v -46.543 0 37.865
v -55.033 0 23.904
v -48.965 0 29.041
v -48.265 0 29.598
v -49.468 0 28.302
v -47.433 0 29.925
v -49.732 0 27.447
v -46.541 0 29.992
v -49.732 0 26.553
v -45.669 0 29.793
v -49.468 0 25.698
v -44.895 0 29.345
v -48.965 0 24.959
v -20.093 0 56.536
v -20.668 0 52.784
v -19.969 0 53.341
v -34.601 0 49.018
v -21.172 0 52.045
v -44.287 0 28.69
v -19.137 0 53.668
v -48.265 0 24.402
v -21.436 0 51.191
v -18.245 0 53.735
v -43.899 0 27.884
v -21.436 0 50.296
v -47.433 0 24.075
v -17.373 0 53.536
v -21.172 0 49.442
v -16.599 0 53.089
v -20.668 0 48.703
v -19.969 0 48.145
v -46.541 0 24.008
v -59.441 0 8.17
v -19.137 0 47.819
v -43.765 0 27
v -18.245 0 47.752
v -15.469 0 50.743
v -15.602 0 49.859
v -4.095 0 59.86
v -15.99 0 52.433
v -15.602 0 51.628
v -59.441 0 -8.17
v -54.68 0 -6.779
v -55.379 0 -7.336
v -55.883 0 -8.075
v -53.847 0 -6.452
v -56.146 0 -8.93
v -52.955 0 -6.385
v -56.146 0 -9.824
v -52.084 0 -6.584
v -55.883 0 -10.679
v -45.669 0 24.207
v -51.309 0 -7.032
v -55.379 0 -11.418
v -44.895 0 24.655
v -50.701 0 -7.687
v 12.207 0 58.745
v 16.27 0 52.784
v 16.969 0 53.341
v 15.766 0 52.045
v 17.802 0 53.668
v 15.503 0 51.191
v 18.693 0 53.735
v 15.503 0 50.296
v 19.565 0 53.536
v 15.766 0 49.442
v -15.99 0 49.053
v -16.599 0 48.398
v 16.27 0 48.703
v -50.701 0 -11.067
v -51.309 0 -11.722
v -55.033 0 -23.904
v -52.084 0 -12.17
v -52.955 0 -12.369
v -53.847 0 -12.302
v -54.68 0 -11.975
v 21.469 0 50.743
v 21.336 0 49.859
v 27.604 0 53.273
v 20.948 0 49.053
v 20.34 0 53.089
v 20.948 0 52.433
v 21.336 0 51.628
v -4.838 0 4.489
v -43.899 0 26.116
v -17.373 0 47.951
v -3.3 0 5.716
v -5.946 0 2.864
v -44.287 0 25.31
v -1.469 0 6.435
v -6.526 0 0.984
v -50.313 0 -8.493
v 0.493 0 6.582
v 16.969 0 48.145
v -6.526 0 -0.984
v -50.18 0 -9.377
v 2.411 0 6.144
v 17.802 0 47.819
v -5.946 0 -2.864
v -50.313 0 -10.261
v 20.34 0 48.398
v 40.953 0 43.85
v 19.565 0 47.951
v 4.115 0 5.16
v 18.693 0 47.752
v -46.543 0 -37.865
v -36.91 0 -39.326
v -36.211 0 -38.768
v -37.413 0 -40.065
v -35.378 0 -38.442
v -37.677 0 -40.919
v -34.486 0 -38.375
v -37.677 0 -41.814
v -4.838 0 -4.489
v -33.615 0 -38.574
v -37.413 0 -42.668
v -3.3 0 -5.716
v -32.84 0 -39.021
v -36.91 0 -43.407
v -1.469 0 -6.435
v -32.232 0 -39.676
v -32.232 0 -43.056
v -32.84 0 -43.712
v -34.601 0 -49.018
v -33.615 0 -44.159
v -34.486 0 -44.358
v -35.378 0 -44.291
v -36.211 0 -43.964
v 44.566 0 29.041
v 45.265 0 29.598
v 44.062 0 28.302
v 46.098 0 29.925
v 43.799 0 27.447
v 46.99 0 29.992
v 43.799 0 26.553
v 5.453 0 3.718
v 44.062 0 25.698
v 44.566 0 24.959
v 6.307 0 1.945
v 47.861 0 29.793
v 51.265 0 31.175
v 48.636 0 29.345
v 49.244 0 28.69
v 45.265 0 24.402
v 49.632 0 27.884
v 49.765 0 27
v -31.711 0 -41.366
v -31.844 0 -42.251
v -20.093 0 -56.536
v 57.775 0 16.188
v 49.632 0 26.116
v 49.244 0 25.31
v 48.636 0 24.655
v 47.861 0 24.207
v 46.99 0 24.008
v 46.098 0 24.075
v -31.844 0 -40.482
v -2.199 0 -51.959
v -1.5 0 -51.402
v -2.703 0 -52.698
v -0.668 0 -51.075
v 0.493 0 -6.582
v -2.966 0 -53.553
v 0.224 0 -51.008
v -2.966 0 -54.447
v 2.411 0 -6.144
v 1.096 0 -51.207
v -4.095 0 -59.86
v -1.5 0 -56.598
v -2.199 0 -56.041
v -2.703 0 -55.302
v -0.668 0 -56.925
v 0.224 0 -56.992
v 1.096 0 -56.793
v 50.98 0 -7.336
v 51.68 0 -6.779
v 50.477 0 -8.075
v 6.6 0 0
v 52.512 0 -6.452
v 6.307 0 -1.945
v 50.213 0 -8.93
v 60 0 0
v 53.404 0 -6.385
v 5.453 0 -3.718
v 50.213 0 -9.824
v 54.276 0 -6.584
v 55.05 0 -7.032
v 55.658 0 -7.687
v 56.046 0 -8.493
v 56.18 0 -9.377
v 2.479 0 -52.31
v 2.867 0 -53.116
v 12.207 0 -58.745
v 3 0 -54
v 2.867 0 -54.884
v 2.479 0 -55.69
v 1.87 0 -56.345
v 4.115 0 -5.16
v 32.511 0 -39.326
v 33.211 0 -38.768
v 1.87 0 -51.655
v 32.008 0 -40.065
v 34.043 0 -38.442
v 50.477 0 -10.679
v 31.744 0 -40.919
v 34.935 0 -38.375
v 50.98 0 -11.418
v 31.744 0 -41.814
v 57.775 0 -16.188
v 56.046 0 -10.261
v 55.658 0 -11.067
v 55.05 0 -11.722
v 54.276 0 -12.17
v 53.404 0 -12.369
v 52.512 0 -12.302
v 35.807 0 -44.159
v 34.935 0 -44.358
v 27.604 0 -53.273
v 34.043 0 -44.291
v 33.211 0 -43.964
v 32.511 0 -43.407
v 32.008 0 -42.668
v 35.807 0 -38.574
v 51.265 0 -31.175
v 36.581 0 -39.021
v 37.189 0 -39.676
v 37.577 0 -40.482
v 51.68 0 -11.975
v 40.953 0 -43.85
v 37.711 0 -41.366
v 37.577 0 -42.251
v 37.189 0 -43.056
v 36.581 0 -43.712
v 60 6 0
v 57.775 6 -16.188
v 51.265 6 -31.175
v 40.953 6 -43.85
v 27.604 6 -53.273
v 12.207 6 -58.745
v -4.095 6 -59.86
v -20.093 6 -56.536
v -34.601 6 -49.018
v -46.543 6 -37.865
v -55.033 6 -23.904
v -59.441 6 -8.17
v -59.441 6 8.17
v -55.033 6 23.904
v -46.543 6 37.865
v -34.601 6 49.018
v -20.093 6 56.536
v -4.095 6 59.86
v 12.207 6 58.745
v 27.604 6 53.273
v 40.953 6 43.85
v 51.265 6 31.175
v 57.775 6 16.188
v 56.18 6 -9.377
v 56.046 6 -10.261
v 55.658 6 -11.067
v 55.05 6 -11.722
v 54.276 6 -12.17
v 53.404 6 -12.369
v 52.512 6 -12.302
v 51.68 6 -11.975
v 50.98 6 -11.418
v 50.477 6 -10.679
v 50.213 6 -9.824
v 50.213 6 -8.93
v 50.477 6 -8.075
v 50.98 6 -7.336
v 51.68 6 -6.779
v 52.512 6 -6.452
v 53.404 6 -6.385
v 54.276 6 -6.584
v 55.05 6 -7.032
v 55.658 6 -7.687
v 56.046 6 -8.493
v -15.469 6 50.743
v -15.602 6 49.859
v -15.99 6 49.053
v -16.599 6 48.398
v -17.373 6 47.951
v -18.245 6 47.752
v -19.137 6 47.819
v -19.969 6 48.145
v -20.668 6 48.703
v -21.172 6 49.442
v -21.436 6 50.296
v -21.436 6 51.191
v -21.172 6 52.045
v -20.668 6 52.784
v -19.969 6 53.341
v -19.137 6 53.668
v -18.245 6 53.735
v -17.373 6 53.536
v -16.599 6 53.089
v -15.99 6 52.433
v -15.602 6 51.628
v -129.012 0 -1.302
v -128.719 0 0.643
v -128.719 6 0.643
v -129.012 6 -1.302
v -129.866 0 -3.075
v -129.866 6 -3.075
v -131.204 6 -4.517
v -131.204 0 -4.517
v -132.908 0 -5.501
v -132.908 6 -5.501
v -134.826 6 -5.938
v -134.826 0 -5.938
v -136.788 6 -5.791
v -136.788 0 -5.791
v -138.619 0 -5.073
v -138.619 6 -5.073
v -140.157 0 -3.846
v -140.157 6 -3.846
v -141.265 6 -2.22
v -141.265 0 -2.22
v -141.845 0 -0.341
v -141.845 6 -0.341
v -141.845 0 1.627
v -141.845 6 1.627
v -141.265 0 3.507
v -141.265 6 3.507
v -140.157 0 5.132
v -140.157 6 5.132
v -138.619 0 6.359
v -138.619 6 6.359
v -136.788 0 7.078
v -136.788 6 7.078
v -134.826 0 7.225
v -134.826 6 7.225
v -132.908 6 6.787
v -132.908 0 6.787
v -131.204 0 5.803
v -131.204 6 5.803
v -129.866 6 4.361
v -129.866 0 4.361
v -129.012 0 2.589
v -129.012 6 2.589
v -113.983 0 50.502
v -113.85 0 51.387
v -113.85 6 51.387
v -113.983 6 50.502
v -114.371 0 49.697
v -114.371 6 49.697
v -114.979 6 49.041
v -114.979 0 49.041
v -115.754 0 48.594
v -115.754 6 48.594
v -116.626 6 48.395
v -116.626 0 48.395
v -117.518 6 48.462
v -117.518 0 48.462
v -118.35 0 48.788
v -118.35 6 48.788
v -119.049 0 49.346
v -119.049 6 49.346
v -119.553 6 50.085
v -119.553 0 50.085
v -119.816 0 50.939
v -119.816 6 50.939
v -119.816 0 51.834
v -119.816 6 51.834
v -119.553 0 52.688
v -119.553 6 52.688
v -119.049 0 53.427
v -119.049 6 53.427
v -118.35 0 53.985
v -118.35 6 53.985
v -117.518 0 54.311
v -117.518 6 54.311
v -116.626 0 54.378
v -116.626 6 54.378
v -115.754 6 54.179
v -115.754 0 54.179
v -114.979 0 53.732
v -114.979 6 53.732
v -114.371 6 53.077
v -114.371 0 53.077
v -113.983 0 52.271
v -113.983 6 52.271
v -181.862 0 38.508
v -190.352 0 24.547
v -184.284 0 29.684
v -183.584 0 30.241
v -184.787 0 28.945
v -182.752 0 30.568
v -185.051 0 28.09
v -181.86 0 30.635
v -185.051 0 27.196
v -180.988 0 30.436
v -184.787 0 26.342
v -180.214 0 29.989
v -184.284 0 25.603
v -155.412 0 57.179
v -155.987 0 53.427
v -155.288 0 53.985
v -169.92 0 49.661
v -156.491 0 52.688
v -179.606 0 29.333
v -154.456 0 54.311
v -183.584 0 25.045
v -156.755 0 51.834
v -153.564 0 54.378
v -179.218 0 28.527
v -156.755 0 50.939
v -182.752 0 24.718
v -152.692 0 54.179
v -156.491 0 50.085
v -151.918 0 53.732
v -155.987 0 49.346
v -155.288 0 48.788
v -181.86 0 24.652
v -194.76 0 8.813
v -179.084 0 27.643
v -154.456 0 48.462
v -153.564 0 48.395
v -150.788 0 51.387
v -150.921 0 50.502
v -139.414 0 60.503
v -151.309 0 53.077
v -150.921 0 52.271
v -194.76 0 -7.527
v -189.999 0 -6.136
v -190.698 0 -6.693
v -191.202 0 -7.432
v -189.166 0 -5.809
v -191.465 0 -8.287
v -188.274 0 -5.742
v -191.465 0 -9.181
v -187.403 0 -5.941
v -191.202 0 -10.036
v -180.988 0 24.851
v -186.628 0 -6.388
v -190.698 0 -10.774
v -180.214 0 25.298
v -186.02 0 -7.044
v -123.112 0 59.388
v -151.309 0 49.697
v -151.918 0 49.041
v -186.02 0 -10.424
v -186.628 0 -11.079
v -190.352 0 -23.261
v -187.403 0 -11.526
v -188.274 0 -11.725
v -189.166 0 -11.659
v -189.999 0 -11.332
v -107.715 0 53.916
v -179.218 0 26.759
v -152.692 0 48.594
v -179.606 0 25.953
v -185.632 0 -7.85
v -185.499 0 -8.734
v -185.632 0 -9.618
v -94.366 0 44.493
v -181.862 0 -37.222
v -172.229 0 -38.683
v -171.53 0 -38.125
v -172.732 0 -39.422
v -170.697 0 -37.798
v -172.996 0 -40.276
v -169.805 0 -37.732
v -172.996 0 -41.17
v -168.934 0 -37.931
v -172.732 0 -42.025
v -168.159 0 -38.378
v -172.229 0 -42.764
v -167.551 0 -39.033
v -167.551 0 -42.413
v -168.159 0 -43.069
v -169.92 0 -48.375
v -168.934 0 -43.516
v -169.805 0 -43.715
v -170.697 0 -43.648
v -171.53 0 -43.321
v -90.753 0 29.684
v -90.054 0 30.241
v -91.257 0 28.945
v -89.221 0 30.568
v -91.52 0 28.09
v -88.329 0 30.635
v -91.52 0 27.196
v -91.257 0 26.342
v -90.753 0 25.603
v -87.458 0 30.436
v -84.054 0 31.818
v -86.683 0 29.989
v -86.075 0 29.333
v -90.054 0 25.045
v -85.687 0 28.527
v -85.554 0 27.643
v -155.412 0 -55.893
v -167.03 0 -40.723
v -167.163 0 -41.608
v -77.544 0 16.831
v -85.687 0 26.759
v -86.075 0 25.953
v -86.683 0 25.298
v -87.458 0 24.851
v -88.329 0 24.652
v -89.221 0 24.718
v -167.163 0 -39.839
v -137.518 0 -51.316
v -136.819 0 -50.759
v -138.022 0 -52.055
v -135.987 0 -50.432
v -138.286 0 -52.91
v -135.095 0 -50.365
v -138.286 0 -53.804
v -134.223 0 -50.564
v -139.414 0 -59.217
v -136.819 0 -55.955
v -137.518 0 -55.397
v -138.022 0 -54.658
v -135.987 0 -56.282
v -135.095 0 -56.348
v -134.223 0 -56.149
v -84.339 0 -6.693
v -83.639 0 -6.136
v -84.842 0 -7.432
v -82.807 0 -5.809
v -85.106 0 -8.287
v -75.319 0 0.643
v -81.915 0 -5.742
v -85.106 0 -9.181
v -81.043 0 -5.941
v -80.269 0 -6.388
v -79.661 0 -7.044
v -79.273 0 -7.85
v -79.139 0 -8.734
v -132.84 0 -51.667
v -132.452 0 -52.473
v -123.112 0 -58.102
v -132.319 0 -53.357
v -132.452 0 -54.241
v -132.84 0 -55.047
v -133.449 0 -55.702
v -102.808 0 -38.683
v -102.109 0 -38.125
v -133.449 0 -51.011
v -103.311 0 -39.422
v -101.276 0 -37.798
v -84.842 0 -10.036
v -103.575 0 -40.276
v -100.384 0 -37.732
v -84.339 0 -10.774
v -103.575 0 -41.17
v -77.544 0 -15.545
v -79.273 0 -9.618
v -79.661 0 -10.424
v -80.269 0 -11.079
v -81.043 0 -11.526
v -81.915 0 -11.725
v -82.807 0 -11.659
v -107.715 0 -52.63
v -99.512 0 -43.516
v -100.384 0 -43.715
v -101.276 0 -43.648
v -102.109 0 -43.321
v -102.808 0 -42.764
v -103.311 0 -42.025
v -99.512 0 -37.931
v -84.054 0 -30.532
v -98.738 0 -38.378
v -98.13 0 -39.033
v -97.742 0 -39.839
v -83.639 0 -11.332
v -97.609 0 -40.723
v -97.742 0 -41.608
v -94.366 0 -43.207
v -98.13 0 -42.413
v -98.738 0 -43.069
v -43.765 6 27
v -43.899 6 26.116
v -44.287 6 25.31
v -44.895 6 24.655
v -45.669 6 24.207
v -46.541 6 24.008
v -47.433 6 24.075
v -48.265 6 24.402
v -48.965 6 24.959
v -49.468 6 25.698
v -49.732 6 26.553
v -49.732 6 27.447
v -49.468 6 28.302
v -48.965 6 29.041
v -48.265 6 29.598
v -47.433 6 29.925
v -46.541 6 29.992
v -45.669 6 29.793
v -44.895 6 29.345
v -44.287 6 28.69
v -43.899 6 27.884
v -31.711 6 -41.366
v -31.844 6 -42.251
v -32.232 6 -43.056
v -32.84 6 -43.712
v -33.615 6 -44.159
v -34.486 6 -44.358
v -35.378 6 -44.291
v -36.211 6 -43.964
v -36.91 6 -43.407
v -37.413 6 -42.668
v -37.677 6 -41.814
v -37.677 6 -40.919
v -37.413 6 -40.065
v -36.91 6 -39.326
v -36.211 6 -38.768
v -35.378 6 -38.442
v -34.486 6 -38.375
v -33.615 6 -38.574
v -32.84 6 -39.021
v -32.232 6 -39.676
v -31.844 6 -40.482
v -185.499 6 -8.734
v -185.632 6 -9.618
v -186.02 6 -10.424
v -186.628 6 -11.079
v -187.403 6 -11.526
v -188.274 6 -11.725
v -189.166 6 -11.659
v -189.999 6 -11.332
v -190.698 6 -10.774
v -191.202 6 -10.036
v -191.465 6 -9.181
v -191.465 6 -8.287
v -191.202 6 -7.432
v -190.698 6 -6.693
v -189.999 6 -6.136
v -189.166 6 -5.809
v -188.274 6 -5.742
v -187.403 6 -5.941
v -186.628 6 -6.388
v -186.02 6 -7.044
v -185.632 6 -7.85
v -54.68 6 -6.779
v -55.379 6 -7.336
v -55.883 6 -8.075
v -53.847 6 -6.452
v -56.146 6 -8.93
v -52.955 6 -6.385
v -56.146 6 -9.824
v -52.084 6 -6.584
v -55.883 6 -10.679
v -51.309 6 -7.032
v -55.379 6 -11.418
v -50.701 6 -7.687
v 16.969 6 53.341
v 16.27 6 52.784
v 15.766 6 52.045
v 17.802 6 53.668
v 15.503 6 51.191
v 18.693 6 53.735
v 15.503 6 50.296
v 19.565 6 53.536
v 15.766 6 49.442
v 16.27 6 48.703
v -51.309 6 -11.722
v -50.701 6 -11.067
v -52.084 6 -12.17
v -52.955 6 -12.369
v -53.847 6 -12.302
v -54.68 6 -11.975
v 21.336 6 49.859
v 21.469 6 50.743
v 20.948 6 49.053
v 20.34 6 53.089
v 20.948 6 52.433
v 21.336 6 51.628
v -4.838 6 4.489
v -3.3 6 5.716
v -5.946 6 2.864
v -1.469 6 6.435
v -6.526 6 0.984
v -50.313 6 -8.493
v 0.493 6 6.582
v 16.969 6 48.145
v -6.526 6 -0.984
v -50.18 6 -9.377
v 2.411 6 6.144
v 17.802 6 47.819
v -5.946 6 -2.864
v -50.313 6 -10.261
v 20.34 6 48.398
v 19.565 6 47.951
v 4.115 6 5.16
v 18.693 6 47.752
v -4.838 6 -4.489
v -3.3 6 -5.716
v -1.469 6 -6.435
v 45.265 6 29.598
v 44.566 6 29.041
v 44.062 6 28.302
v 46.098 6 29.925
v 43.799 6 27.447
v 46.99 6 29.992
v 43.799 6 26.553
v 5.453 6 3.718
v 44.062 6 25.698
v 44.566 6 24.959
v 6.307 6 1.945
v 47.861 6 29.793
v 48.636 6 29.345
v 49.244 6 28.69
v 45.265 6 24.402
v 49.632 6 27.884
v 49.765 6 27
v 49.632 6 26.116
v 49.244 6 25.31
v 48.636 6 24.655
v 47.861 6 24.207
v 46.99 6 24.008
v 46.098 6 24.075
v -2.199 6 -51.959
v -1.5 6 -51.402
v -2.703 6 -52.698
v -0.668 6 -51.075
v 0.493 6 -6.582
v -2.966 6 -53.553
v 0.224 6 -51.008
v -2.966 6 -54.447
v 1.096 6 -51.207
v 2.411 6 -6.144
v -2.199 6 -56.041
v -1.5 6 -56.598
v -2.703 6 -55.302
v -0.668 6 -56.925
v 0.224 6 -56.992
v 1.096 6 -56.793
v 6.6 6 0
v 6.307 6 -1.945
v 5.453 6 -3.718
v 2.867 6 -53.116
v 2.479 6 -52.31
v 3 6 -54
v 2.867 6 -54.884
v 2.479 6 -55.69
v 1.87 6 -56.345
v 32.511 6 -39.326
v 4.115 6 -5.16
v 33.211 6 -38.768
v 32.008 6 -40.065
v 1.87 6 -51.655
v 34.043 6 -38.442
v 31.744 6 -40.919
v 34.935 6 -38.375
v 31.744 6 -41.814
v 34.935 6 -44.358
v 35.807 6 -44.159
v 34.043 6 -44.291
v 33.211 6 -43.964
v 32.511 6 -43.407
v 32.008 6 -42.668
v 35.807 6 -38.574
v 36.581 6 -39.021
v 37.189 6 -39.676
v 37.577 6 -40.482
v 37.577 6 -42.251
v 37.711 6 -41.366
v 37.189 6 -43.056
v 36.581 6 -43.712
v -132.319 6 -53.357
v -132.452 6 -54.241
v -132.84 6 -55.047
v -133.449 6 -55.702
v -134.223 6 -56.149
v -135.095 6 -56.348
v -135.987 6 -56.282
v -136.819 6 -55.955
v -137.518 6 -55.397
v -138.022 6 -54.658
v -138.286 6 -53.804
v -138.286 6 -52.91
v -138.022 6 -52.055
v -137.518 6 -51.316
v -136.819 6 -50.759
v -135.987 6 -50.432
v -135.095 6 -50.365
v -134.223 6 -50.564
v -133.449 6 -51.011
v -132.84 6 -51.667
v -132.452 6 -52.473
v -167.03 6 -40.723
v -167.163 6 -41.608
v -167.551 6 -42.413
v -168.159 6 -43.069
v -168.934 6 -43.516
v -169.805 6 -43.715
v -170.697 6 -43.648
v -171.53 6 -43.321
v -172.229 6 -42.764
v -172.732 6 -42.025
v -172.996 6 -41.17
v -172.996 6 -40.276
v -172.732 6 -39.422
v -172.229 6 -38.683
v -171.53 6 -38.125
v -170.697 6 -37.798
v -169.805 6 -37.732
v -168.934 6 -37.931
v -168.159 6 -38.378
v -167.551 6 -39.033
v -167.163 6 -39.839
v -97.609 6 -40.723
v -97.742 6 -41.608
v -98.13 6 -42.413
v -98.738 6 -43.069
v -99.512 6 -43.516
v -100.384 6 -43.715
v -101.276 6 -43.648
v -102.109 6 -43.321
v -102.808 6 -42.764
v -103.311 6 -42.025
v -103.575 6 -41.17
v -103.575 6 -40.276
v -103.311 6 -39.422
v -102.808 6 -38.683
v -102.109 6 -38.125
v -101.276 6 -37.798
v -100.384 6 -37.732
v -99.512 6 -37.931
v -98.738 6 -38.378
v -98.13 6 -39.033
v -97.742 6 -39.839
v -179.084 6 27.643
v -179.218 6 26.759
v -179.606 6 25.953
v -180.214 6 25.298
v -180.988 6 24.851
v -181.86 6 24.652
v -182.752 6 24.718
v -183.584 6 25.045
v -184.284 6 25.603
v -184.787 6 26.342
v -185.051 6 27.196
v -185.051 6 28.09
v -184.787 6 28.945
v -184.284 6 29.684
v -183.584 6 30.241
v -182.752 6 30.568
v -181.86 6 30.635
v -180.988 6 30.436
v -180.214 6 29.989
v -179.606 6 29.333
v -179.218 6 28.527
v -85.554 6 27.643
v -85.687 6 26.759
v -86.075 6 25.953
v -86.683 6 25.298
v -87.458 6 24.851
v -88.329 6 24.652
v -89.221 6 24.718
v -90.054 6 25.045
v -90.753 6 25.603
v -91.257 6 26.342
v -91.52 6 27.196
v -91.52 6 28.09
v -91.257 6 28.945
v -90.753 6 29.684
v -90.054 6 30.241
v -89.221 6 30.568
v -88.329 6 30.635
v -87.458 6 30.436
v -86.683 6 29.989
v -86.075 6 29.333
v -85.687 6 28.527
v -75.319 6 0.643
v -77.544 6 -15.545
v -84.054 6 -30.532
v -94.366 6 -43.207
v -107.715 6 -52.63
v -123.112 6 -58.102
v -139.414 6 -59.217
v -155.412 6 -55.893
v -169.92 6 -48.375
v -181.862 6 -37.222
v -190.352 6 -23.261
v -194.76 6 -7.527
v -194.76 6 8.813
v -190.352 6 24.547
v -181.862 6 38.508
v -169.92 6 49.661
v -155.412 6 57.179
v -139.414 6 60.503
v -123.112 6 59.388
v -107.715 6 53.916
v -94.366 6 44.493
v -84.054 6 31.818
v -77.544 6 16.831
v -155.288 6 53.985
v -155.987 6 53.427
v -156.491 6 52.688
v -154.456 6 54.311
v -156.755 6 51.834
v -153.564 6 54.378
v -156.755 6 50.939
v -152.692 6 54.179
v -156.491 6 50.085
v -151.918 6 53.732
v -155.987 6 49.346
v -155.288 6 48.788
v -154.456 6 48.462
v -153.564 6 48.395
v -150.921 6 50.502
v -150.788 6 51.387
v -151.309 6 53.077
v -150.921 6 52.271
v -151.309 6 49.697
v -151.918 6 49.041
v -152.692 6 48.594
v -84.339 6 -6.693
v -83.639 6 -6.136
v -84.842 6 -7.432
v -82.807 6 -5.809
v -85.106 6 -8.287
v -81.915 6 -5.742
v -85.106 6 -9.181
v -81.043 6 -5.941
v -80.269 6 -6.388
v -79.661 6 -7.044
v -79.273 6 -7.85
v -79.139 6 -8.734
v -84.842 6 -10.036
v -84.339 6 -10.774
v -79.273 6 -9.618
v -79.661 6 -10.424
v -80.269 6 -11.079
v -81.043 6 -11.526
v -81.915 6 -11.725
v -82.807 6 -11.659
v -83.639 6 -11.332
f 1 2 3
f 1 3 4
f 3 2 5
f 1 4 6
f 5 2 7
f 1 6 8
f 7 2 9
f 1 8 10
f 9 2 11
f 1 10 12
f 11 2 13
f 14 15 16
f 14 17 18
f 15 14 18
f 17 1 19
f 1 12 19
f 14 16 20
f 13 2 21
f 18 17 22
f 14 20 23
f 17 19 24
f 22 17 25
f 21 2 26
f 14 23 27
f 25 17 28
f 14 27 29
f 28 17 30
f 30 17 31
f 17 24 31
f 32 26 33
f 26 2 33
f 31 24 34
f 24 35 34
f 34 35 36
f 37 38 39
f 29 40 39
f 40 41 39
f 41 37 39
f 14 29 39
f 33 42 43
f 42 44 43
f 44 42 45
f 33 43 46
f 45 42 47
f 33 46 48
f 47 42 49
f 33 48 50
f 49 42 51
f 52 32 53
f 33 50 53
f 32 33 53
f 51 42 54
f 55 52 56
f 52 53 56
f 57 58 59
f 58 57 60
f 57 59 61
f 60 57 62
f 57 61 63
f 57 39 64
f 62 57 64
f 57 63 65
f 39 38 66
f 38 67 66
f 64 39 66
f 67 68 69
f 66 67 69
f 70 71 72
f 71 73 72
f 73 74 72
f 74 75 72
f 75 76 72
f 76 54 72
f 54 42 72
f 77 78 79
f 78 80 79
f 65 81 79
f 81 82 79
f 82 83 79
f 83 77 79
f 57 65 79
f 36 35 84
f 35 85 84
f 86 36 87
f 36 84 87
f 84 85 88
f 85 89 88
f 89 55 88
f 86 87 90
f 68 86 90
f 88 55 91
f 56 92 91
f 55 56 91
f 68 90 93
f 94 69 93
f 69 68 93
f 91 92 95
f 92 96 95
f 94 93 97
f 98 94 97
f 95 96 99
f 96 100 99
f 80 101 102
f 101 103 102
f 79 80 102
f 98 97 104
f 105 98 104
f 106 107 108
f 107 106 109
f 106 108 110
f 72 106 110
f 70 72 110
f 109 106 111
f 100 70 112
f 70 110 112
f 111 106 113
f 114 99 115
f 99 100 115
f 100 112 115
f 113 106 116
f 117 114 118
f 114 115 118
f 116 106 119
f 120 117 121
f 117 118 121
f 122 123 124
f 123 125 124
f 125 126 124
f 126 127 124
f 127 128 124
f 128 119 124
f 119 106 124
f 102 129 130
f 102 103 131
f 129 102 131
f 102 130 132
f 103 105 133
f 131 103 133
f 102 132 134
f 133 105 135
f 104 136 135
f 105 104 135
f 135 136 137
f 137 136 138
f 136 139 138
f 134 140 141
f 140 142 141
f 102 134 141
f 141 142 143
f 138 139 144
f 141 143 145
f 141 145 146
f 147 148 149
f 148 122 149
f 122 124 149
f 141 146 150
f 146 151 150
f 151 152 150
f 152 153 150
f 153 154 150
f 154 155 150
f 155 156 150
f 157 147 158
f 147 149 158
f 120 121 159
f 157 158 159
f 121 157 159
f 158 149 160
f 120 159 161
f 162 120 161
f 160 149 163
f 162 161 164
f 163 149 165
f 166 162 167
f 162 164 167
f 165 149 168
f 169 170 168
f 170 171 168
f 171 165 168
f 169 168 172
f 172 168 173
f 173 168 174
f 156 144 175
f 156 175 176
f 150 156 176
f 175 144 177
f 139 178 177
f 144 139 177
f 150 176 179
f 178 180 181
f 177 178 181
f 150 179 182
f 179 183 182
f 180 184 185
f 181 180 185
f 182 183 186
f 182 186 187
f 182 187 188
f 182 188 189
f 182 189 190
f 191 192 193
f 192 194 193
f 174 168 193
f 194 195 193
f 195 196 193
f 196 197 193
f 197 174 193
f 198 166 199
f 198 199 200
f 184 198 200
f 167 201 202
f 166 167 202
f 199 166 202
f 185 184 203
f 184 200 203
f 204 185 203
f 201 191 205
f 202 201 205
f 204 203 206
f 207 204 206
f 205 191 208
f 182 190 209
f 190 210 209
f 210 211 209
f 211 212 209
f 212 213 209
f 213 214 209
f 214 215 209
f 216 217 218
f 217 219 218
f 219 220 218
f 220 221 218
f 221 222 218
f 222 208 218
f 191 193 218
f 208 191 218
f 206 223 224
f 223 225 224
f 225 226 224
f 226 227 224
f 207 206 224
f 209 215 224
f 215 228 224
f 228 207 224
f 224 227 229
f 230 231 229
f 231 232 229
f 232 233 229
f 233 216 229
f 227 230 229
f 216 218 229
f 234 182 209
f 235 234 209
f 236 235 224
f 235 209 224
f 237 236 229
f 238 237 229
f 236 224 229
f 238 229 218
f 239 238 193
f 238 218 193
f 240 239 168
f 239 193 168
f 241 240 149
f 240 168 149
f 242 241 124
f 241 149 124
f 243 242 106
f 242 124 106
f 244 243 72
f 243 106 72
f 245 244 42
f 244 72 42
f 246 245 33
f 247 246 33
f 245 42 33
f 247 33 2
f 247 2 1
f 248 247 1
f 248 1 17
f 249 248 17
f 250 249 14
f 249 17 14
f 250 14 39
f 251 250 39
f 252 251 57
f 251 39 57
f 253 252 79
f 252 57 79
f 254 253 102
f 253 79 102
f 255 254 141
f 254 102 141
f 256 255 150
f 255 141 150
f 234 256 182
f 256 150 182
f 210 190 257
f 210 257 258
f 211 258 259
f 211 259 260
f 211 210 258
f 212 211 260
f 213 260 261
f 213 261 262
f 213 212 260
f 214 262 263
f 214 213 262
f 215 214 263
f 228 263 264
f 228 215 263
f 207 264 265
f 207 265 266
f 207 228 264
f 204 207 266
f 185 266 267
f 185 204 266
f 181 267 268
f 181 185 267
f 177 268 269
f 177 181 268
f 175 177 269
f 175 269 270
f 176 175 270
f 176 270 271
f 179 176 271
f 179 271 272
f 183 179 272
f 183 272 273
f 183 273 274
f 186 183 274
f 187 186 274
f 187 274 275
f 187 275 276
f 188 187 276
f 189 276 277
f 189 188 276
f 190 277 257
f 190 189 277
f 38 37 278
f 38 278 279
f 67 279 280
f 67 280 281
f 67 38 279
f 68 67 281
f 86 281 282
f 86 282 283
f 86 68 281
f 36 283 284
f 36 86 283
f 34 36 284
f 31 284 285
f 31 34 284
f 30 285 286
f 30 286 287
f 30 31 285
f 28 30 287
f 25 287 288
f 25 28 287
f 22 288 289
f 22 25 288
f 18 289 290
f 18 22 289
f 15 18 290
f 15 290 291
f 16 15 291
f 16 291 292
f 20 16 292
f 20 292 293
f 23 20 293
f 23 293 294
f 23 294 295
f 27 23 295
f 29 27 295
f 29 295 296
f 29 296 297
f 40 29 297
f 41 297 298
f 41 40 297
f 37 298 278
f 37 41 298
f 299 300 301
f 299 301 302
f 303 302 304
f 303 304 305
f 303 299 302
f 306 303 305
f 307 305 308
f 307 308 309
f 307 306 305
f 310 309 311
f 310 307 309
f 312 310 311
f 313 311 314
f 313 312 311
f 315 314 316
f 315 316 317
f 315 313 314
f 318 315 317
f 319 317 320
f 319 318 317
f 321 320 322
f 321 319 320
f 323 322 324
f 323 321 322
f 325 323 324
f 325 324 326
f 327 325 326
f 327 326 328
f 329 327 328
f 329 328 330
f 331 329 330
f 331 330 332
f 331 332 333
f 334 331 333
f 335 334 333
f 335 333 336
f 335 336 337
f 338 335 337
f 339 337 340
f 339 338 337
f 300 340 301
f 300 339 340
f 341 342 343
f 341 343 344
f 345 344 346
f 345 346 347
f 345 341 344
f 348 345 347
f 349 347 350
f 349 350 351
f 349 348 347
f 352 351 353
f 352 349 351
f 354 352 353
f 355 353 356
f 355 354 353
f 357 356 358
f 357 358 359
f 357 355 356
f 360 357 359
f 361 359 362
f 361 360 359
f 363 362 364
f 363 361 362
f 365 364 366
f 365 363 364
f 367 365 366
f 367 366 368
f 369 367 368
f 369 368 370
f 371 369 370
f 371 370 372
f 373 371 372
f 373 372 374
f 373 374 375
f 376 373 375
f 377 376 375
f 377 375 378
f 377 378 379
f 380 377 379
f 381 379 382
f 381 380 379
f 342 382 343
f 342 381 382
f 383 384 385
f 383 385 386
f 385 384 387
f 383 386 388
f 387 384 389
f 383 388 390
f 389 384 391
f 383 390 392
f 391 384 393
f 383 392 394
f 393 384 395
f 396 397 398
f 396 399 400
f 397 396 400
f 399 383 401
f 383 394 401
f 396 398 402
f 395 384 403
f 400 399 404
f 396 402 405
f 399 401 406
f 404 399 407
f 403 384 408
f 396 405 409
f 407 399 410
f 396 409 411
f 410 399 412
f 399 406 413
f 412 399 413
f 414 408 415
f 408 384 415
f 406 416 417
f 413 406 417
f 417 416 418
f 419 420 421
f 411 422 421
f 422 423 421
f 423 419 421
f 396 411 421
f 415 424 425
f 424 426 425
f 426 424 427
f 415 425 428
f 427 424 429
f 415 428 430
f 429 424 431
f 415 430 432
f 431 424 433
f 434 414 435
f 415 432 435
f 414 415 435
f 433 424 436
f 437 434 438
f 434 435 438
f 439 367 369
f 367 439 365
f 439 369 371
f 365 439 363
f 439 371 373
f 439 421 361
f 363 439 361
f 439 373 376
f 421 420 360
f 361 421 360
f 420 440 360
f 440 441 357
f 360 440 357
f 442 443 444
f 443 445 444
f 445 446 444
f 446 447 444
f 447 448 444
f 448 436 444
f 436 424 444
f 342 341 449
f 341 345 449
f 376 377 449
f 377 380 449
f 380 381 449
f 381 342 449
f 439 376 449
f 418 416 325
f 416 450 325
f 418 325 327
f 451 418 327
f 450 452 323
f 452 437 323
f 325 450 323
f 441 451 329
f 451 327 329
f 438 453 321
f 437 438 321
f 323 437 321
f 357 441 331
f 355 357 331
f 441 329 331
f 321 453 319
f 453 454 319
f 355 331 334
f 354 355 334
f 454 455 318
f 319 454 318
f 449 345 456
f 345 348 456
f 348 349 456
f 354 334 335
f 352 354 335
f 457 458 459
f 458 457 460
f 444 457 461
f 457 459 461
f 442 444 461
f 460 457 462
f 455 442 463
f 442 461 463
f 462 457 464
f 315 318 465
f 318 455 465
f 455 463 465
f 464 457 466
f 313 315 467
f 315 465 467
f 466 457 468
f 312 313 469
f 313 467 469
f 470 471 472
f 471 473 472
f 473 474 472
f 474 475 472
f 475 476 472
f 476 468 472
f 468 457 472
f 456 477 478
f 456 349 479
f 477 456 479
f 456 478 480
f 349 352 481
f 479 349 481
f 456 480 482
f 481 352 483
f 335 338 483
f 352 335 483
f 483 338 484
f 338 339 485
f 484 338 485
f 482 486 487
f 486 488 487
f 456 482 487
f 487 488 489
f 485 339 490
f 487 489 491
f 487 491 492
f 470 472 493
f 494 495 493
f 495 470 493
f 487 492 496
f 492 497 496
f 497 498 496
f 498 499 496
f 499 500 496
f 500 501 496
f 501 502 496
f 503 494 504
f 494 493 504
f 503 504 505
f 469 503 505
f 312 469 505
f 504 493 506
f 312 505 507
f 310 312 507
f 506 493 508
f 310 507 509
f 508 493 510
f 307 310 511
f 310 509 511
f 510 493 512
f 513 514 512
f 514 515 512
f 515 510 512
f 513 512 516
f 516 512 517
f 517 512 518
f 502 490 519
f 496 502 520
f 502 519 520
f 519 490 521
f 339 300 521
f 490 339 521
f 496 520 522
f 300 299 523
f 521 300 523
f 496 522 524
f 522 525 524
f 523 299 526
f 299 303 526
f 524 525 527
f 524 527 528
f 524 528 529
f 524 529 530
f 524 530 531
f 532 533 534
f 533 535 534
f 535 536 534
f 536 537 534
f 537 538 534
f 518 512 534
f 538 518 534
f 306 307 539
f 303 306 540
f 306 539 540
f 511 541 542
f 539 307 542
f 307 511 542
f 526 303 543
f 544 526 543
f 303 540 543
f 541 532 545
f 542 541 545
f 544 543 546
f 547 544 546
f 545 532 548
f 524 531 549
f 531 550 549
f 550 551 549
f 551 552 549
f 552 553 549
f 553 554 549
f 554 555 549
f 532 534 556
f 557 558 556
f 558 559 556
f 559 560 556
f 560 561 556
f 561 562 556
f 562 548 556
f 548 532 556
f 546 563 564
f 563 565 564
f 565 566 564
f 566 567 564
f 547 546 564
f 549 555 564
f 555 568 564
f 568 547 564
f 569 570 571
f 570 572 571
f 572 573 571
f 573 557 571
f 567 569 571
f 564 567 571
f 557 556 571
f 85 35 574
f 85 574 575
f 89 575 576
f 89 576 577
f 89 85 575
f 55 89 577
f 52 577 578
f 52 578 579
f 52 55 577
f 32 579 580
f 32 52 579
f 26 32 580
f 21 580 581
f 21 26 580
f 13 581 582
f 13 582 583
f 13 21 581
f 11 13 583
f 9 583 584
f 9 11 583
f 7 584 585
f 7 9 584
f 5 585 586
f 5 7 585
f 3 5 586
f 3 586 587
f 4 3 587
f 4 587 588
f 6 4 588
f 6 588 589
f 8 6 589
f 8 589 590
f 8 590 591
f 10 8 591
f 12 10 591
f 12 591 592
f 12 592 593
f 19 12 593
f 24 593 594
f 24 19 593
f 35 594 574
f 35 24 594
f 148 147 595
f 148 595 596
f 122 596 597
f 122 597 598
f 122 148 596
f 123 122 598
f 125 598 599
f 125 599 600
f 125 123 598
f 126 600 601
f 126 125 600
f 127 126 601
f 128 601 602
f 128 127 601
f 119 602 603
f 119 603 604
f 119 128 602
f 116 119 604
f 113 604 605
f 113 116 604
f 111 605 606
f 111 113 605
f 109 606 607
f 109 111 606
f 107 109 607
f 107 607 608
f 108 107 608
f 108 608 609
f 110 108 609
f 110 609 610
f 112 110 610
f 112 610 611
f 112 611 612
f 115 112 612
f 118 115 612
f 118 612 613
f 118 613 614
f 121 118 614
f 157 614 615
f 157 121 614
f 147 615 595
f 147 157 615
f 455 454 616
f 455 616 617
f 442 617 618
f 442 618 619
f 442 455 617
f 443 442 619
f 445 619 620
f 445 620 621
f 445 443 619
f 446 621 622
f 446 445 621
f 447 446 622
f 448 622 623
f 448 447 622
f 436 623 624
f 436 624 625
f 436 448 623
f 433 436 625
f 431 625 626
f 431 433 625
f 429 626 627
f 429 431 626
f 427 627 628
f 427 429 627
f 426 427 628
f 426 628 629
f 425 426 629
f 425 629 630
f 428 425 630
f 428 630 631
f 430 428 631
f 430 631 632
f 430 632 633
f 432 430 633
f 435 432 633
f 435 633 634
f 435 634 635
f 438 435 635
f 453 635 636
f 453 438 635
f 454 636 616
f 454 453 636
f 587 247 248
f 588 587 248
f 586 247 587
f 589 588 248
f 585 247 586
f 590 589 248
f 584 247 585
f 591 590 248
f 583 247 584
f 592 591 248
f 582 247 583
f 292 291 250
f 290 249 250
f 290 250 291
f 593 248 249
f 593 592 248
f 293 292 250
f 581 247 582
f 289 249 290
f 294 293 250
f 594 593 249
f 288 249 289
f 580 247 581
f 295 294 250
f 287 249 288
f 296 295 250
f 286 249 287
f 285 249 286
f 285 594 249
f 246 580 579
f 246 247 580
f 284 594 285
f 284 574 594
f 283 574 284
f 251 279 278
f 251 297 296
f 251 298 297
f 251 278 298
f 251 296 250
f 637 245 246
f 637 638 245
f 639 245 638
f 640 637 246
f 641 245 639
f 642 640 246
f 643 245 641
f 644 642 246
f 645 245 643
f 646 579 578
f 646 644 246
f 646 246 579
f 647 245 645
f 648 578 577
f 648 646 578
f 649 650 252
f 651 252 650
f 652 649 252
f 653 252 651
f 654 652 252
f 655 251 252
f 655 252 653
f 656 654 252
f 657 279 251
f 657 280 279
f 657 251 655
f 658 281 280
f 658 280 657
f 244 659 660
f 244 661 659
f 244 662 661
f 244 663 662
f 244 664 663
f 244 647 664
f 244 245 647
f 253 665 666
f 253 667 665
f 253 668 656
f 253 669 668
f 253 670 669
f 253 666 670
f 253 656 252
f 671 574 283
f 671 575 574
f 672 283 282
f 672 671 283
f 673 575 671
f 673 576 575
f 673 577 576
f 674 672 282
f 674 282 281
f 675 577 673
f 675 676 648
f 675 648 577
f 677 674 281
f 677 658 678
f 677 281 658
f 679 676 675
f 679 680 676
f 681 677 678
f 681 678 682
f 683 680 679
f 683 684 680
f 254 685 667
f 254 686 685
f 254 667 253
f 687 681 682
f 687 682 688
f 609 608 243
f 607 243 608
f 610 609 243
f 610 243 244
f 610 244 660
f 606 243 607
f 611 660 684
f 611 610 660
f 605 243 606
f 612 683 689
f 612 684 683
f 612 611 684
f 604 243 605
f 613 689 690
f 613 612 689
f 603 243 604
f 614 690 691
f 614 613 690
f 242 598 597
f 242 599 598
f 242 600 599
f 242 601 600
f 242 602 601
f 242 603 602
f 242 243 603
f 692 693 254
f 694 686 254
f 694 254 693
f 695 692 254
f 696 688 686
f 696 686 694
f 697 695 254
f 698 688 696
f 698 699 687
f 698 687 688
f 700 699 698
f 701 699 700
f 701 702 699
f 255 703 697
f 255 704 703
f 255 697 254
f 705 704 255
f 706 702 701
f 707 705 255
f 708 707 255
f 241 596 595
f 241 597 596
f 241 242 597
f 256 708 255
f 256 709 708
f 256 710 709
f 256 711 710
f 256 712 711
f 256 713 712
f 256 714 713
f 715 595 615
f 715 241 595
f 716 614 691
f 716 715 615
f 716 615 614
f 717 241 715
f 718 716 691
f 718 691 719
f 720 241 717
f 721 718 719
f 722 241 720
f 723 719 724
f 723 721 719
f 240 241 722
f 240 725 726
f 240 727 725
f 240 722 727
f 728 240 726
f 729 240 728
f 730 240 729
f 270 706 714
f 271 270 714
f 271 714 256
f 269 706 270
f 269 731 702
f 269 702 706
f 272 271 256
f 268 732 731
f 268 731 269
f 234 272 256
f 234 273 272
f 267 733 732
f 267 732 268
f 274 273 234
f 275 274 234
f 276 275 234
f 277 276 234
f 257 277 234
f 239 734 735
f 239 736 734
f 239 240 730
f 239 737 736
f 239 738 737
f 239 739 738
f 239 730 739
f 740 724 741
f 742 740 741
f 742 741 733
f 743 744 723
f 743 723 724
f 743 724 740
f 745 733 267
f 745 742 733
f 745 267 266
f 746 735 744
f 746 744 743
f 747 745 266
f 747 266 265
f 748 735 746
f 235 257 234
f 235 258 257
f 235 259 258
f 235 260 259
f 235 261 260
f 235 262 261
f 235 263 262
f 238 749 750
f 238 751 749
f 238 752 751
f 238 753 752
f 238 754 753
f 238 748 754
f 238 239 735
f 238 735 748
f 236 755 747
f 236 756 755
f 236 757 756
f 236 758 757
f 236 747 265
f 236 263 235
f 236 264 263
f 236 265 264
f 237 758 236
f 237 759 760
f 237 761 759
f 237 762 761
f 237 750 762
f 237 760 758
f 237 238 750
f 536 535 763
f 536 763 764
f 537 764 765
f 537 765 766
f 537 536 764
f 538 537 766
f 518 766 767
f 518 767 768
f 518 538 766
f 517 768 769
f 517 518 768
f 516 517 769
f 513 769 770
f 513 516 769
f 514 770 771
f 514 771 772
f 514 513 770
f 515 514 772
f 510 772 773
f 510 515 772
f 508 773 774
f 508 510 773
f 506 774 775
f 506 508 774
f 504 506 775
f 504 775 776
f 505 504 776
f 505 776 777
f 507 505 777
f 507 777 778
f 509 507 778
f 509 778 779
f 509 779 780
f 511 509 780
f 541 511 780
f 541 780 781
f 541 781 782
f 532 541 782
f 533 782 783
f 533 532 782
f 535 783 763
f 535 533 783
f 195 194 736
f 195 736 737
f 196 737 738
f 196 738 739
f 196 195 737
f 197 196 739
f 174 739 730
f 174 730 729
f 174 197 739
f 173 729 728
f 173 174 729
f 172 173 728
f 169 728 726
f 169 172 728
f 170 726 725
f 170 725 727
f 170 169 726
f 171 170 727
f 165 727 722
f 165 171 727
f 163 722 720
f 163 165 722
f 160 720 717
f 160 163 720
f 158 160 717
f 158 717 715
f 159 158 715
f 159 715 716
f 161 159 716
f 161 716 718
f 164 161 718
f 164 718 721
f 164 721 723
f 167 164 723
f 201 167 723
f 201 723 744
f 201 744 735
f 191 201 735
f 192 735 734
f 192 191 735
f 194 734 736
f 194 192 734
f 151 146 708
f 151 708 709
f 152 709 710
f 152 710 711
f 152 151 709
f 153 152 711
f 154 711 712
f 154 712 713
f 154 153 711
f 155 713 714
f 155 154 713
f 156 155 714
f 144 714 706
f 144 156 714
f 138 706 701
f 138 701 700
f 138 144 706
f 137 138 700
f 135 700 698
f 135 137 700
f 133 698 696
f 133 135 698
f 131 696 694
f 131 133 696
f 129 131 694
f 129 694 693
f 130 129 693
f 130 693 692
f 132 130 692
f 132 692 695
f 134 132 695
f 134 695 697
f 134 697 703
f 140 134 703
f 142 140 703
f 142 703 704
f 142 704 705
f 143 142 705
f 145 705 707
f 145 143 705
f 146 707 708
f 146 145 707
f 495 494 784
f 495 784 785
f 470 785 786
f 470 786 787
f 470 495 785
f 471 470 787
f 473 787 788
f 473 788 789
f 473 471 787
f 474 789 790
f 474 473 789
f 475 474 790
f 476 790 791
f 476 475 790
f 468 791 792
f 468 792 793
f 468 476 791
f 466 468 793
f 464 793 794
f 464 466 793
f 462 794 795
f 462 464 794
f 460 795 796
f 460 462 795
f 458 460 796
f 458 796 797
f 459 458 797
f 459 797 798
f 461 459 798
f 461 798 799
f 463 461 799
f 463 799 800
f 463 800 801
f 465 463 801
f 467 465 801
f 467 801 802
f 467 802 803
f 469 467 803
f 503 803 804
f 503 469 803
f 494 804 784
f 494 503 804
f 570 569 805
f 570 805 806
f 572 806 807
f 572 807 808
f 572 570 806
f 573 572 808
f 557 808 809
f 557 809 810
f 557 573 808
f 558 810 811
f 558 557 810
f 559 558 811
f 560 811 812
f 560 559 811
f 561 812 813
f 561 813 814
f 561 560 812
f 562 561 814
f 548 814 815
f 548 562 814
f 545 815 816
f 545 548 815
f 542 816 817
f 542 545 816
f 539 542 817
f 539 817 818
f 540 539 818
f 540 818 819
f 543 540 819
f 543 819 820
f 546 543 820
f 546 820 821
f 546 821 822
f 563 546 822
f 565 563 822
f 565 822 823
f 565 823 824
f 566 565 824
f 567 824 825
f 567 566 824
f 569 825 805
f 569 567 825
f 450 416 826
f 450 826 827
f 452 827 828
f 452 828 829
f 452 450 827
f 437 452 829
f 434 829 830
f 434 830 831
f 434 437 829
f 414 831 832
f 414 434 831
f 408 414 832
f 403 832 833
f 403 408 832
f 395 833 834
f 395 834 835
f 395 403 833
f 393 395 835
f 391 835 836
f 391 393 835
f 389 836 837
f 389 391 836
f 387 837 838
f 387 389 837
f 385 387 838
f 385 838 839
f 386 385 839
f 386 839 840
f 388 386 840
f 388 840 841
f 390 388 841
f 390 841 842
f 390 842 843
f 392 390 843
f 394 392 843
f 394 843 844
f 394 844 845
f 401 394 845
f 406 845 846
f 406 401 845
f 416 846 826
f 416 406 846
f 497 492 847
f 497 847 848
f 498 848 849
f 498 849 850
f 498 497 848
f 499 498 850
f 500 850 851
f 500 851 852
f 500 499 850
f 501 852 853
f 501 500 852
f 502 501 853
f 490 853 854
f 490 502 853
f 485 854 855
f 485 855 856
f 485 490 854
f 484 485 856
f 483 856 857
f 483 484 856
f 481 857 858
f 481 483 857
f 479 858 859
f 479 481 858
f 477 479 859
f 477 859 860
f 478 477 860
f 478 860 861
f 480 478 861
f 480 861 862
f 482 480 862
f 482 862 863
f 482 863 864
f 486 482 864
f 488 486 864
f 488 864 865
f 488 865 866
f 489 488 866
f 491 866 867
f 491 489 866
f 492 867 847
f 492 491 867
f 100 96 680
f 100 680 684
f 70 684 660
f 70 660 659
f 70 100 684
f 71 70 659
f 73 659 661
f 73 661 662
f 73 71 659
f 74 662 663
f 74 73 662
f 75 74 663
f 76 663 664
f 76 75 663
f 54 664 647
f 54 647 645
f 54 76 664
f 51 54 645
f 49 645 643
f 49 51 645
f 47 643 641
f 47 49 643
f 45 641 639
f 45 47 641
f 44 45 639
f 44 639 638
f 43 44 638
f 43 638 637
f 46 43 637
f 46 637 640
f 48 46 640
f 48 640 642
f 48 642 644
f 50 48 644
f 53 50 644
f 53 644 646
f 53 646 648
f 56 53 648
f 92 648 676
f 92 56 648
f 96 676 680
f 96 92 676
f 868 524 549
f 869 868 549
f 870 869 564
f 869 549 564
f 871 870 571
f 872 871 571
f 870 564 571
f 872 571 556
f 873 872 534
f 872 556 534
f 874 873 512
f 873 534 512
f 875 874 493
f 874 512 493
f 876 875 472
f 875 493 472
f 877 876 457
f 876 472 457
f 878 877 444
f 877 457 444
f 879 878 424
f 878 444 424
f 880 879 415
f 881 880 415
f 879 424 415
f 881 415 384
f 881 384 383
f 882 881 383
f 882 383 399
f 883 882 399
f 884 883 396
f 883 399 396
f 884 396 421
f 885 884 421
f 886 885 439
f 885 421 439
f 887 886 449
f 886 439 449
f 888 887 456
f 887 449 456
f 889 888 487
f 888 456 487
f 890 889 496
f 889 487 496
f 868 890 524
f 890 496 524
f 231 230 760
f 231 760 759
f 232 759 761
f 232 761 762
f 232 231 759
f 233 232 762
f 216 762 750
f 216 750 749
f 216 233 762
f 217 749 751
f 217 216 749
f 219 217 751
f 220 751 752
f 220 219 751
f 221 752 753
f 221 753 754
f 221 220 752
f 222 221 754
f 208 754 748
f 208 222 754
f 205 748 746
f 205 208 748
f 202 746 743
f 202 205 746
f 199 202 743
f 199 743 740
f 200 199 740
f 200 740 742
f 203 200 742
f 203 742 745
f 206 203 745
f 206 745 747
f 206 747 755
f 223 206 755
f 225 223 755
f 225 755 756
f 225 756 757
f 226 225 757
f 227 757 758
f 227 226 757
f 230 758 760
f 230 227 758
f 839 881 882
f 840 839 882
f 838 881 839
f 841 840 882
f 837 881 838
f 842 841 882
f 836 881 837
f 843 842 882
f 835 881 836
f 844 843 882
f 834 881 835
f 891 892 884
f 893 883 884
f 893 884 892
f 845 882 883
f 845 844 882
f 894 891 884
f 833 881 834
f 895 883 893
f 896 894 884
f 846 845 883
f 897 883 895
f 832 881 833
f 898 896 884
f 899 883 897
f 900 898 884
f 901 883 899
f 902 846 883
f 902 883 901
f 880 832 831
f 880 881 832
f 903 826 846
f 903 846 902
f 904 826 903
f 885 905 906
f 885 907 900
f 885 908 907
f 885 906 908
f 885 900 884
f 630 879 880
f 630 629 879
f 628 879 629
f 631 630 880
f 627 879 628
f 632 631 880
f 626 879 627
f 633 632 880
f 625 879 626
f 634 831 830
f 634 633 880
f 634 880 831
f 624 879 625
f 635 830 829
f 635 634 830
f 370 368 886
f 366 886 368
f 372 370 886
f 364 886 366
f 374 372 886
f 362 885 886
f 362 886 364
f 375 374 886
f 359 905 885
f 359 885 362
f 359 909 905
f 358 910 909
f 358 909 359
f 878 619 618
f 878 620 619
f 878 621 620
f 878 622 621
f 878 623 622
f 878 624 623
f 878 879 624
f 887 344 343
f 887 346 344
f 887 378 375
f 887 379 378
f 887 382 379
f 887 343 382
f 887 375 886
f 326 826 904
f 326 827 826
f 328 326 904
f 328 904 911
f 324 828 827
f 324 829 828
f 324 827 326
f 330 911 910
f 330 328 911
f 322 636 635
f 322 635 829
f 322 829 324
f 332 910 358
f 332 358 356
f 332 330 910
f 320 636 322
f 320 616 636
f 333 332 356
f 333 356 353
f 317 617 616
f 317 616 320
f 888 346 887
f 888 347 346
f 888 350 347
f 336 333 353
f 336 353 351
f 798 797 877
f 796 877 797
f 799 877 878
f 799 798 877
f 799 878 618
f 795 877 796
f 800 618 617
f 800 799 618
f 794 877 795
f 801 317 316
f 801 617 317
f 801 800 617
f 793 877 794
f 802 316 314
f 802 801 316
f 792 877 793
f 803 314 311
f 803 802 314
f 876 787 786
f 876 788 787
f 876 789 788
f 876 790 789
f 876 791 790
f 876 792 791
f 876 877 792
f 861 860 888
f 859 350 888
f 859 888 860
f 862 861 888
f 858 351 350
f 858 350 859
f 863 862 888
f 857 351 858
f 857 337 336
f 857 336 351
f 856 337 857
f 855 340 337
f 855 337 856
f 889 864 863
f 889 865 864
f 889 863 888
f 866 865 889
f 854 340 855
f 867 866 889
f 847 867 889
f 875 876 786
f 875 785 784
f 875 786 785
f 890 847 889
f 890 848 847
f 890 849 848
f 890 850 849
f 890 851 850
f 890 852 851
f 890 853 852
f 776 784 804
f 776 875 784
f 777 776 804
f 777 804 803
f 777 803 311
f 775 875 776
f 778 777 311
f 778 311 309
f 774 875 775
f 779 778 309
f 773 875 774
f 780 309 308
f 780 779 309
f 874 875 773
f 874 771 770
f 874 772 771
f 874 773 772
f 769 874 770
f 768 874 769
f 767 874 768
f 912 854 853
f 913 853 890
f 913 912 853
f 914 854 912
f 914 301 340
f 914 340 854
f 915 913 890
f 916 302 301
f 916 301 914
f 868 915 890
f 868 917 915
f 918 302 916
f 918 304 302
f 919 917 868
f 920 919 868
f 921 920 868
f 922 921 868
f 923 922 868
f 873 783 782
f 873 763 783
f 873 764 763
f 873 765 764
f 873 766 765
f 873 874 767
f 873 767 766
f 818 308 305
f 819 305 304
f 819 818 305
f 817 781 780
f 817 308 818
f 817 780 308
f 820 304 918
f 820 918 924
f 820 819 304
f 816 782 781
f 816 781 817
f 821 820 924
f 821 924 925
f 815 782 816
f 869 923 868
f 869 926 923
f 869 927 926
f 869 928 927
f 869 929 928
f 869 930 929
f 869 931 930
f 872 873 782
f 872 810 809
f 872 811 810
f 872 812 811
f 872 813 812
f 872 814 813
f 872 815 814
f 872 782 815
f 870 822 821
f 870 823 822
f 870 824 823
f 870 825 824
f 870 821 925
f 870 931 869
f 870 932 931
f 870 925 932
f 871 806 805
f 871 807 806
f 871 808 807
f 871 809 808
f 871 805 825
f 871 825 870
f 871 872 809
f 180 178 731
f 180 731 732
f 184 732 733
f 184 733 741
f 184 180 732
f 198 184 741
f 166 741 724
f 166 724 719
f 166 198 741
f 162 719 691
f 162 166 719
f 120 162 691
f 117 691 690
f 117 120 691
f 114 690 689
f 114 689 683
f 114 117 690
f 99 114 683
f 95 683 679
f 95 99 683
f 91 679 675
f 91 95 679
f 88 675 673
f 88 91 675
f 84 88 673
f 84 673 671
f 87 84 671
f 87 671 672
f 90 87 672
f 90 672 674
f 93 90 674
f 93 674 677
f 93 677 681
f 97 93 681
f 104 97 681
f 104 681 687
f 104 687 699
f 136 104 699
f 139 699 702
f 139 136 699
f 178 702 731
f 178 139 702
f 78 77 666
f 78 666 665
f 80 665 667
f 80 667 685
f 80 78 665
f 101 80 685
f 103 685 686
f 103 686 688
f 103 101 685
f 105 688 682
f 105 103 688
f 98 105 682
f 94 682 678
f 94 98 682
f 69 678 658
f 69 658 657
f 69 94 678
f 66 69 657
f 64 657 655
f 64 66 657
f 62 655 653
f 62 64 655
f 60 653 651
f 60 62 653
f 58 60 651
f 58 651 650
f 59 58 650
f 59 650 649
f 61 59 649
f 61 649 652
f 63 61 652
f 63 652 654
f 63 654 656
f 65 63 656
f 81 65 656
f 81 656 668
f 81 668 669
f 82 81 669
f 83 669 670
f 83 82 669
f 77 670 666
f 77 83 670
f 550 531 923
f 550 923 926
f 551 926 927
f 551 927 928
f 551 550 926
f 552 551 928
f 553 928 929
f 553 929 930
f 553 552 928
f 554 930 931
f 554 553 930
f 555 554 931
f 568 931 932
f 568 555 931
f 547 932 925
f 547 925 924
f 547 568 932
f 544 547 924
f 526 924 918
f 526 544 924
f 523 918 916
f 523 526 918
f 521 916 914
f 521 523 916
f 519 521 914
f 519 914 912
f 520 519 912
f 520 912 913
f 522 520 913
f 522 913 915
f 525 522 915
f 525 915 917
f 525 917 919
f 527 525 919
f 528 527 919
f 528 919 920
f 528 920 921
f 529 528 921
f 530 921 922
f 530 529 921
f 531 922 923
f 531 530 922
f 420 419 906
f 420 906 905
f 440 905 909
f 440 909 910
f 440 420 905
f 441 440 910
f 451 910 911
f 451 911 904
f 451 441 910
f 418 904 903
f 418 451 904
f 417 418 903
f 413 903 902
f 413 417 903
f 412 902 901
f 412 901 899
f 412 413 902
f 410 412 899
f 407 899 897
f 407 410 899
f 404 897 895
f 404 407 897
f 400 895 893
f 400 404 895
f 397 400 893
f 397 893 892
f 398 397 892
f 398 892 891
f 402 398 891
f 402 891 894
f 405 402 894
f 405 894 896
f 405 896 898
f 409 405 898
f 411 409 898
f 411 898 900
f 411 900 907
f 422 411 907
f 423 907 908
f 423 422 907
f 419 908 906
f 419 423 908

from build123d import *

# Parameters (mm, degrees)
SKETCH_1_R        = 60
SKETCH_1_R_2      = 3
SKETCH_1_R_3      = 6.6
EXTRUDE_1_DEPTH   = 6
EXTRUDE_1_2_DEPTH = 6


with BuildPart() as part:
    # 草图1 → 凸台-拉伸1 (new body)
    with BuildSketch(Plane(origin=(0, 0, 0), x_dir=(1, 0, 0), z_dir=(0, 1, 0))):
        Circle(SKETCH_1_R)
        with Locations((0, 54)):
            Circle(SKETCH_1_R_2, mode=Mode.SUBTRACT)
        Circle(SKETCH_1_R_3, mode=Mode.SUBTRACT)
        with Locations((34.710530923, 41.366399928)):
            Circle(SKETCH_1_R_2, mode=Mode.SUBTRACT)
        with Locations((53.179618663, 9.377001594)):
            Circle(SKETCH_1_R_2, mode=Mode.SUBTRACT)
        with Locations((46.765371804, -27)):
            Circle(SKETCH_1_R_2, mode=Mode.SUBTRACT)
        with Locations((18.46908774, -50.743401522)):
            Circle(SKETCH_1_R_2, mode=Mode.SUBTRACT)
        with Locations((-18.46908774, -50.743401522)):
            Circle(SKETCH_1_R_2, mode=Mode.SUBTRACT)
        with Locations((-46.765371804, -27)):
            Circle(SKETCH_1_R_2, mode=Mode.SUBTRACT)
        with Locations((-53.179618663, 9.377001594)):
            Circle(SKETCH_1_R_2, mode=Mode.SUBTRACT)
        with Locations((-34.710530923, 41.366399928)):
            Circle(SKETCH_1_R_2, mode=Mode.SUBTRACT)
    extrude(amount=EXTRUDE_1_DEPTH)


with BuildPart() as body_2:
    # 草图1 → Extrude 1 2 (new body)
    with BuildSketch(Plane(origin=(0, 0, 0), x_dir=(1, 0, 0), z_dir=(0, 1, 0))):
        with Locations((-135.319032656, -0.643151296)):
            Circle(SKETCH_1_R)
        with Locations((-135.319032656, 53.356848704)):
            Circle(SKETCH_1_R_2, mode=Mode.SUBTRACT)
        with Locations((-135.319032656, -0.643151296)):
            Circle(SKETCH_1_R_3, mode=Mode.SUBTRACT)
        with Locations((-100.608501733, 40.723248633)):
            Circle(SKETCH_1_R_2, mode=Mode.SUBTRACT)
        with Locations((-82.139413994, 8.733850298)):
            Circle(SKETCH_1_R_2, mode=Mode.SUBTRACT)
        with Locations((-88.553660852, -27.643151296)):
            Circle(SKETCH_1_R_2, mode=Mode.SUBTRACT)
        with Locations((-116.849944917, -51.386552818)):
            Circle(SKETCH_1_R_2, mode=Mode.SUBTRACT)
        with Locations((-153.788120396, -51.386552818)):
            Circle(SKETCH_1_R_2, mode=Mode.SUBTRACT)
        with Locations((-182.084404461, -27.643151296)):
            Circle(SKETCH_1_R_2, mode=Mode.SUBTRACT)
        with Locations((-188.498651319, 8.733850298)):
            Circle(SKETCH_1_R_2, mode=Mode.SUBTRACT)
        with Locations((-170.02956358, 40.723248633)):
            Circle(SKETCH_1_R_2, mode=Mode.SUBTRACT)
    extrude(amount=EXTRUDE_1_2_DEPTH)


solid = Compound([part.part, body_2.part])
